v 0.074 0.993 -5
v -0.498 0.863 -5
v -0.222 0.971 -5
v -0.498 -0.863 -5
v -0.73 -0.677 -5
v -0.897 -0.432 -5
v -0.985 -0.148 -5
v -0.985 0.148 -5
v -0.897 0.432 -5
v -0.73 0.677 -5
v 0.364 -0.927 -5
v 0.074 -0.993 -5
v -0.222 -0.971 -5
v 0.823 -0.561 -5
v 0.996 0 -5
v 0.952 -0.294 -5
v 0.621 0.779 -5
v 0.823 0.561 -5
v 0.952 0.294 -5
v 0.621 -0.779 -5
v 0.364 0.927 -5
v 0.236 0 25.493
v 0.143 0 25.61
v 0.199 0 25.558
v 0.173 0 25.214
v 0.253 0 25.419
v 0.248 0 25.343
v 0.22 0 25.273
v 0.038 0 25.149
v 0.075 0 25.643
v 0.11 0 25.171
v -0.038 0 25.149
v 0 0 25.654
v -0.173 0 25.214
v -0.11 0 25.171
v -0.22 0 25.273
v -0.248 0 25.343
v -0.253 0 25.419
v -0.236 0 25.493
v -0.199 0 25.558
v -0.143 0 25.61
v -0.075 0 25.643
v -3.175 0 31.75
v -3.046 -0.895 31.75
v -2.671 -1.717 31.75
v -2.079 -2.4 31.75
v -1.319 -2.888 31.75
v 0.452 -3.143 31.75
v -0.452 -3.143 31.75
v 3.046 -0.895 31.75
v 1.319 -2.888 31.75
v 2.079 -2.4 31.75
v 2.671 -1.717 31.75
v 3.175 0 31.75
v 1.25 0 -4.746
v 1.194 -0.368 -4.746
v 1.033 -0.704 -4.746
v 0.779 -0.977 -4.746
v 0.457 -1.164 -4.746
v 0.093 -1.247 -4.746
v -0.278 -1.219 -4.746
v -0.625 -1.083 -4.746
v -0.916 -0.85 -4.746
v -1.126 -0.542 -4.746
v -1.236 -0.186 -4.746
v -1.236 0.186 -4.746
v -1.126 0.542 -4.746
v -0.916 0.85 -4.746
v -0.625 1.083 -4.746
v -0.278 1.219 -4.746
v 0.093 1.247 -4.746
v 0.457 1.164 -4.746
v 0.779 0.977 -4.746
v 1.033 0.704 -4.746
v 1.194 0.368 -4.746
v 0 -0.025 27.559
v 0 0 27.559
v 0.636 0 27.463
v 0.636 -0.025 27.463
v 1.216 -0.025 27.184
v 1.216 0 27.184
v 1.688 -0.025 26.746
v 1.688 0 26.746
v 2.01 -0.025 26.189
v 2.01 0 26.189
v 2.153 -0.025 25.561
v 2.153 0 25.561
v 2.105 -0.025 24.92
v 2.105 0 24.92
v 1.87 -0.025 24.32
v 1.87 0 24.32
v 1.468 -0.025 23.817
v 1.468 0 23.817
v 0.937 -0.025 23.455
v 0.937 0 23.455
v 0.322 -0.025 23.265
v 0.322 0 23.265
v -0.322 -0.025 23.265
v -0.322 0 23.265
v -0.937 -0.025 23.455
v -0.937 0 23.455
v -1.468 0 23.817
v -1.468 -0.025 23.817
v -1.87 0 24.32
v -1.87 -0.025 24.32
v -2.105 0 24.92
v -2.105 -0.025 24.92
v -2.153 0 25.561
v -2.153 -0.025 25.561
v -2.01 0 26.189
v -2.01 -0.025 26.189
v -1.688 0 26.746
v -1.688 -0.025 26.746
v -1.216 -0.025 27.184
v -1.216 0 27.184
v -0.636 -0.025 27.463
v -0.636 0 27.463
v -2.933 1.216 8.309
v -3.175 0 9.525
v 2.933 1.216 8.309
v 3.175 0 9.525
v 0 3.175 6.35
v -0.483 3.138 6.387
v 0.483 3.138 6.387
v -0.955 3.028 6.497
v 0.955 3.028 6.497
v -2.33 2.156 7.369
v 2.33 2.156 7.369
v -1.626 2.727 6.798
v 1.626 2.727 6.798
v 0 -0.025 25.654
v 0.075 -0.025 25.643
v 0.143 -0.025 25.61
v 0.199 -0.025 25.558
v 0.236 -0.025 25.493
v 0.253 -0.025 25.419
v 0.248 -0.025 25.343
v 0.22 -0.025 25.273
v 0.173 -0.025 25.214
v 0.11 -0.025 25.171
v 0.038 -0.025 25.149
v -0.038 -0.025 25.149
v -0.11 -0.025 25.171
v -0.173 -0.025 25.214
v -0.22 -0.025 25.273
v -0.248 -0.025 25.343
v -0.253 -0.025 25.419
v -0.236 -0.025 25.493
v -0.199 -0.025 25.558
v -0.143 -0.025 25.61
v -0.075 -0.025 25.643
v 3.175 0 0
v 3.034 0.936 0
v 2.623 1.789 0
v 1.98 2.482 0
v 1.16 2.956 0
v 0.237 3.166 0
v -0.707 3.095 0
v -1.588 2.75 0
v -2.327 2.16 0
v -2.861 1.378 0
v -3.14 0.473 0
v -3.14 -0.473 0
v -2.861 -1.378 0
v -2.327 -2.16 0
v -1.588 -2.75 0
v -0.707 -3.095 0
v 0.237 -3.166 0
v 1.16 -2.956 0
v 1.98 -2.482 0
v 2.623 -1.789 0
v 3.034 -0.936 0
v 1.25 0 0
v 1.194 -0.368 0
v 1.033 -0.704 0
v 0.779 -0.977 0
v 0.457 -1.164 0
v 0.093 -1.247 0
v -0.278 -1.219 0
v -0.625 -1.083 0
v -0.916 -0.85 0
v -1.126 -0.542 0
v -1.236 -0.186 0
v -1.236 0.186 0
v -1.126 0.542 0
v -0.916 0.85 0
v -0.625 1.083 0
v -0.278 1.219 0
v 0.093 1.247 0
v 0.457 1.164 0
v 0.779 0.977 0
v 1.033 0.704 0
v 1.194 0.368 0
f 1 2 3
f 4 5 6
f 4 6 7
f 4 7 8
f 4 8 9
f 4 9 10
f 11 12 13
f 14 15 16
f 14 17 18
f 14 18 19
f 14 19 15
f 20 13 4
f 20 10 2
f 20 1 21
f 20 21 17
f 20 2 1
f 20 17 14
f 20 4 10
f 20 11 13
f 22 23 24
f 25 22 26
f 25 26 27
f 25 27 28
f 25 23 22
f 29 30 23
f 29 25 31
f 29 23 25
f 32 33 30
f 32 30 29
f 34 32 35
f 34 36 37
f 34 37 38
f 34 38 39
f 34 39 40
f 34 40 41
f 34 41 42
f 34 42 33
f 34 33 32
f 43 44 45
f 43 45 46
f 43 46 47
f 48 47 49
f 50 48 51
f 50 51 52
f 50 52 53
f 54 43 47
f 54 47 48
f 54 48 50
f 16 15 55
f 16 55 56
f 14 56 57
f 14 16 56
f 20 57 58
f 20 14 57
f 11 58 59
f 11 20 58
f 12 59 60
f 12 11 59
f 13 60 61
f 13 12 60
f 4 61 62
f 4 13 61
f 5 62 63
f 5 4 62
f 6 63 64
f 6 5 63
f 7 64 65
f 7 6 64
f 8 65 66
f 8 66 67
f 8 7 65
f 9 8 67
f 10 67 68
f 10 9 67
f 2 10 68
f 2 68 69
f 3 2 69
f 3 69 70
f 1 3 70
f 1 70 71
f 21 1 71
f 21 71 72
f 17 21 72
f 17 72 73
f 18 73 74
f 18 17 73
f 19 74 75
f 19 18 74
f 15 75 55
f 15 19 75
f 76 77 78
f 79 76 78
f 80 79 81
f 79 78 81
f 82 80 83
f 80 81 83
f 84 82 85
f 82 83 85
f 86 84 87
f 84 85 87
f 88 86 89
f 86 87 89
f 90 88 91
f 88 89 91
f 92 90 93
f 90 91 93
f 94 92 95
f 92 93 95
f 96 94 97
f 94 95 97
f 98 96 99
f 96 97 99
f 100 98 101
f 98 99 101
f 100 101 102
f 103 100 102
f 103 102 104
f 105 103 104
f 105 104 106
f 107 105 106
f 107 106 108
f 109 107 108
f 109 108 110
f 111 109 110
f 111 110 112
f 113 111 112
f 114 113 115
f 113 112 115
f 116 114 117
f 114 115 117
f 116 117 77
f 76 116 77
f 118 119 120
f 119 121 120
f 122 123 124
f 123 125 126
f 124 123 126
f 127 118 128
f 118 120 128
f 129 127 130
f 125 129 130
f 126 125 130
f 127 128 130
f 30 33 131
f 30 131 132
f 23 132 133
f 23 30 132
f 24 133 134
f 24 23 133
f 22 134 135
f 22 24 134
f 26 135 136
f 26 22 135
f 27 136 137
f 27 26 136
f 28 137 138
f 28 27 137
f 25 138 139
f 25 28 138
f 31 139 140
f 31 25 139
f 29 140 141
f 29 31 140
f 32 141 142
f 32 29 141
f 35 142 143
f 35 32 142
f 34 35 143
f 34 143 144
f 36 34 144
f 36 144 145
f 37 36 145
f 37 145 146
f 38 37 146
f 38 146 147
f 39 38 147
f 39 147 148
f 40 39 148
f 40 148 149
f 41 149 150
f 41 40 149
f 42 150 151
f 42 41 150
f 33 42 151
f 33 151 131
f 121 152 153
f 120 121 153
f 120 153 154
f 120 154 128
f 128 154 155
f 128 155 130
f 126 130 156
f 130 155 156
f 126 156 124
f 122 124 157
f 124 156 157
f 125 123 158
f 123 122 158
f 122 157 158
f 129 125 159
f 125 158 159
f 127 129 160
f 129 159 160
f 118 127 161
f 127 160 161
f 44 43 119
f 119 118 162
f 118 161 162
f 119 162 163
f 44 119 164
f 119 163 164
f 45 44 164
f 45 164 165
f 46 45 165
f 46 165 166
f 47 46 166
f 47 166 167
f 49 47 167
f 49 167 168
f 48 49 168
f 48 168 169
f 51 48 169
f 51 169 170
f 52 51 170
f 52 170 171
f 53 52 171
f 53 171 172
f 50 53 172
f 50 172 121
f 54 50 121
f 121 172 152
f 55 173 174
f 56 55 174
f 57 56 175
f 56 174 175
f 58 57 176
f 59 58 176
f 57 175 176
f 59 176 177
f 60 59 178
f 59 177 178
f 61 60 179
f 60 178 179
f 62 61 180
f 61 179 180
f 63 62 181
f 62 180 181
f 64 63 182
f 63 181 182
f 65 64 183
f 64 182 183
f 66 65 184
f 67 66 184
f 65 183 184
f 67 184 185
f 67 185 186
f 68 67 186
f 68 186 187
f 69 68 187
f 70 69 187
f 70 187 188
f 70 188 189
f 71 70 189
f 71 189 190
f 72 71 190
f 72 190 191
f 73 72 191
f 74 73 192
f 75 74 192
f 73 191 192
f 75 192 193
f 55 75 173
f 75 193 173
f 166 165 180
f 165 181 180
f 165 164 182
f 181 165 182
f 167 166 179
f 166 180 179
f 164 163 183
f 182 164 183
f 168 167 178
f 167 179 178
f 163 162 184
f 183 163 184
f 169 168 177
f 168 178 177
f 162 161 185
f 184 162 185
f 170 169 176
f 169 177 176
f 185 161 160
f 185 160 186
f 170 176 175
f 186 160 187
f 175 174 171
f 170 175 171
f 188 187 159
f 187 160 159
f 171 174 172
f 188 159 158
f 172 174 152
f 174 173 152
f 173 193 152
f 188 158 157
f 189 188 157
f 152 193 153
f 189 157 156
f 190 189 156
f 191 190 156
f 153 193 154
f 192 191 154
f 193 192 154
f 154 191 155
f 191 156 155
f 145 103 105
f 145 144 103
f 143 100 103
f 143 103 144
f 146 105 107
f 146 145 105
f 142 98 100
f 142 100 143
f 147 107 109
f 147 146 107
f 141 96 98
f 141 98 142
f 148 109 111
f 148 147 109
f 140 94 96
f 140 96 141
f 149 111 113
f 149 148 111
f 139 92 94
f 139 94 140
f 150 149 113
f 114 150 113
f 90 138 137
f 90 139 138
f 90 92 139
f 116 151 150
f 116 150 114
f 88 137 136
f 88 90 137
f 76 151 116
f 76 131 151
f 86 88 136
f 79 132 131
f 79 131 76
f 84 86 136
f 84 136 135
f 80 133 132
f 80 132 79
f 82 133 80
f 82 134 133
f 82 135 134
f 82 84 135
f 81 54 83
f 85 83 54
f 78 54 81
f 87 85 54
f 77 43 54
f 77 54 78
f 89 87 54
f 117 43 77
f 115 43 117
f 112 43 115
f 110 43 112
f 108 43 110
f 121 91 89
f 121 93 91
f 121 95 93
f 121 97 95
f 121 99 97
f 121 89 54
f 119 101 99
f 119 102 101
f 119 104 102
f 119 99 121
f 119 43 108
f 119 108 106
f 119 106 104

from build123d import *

# Parameters (mm, degrees)
SKETCH1_R           = 3.175
EXTRUDE1_DEPTH      = 31.75
SKETCH2_R           = 1.25
EXTRUDE2_DEPTH      = 5
CHAMFER1_SIZE       = 0.254
EXTRUDE3_DEPTH      = 4.175
EXTRUDE3_DEPTH_BACK = 4.175
SKETCH4_R           = 2.159
SKETCH4_R_2         = 0.254
EXTRUDE4_DEPTH      = 0.0254


with BuildPart() as part:
    # Sketch1 → Extrude1 (new body)
    with BuildSketch(Plane.XY):
        Circle(SKETCH1_R)
    extrude(amount=EXTRUDE1_DEPTH)

    # Sketch2 → Extrude2 (add)
    with BuildSketch(Plane(origin=(0, 0, 0), x_dir=(-1, 0, 0), z_dir=(0, 0, -1))):
        with Locations(Location((0, 0, 0), (0, 0, 180))):  # turned: the seam where the file's is
            Circle(SKETCH2_R)
    extrude(amount=EXTRUDE2_DEPTH)

    # Chamfer1
    chamfer1_edges = [part.edges().sort_by_distance(p)[0] for p in [
        (-1.25, 0, -5),
    ]]
    chamfer(chamfer1_edges, length=CHAMFER1_SIZE)

    # Sketch3 → Extrude3 (cut, two sides)
    with BuildSketch(Plane(origin=(0, 0, 0), x_dir=(0, 0, -1), z_dir=(1, 0, 0))) as extrude3_sk:
        Polygon((-31.75, 0), (-9.525, 0), (-6.35, 3.175), (-31.75, 3.175), align=None)
    extrude(amount=EXTRUDE3_DEPTH, mode=Mode.SUBTRACT)
    extrude(extrude3_sk.sketch, amount=-EXTRUDE3_DEPTH_BACK, mode=Mode.SUBTRACT)

    # Sketch4 → Extrude4 (cut)
    with BuildSketch(Plane(origin=(0, 0, 0), x_dir=(1, 0, 0), z_dir=(0, 1, 0))):
        with Locations(Location((0, -25.4, 0), (0, 0, 270))):  # turned: the seam where the file's is
            Circle(SKETCH4_R)
        with Locations(Location((0, -25.4, 0), (0, 0, 270))):  # turned: the seam where the file's is
            Circle(SKETCH4_R_2, mode=Mode.SUBTRACT)
    extrude(amount=-EXTRUDE4_DEPTH, mode=Mode.SUBTRACT)


solid = part.part
